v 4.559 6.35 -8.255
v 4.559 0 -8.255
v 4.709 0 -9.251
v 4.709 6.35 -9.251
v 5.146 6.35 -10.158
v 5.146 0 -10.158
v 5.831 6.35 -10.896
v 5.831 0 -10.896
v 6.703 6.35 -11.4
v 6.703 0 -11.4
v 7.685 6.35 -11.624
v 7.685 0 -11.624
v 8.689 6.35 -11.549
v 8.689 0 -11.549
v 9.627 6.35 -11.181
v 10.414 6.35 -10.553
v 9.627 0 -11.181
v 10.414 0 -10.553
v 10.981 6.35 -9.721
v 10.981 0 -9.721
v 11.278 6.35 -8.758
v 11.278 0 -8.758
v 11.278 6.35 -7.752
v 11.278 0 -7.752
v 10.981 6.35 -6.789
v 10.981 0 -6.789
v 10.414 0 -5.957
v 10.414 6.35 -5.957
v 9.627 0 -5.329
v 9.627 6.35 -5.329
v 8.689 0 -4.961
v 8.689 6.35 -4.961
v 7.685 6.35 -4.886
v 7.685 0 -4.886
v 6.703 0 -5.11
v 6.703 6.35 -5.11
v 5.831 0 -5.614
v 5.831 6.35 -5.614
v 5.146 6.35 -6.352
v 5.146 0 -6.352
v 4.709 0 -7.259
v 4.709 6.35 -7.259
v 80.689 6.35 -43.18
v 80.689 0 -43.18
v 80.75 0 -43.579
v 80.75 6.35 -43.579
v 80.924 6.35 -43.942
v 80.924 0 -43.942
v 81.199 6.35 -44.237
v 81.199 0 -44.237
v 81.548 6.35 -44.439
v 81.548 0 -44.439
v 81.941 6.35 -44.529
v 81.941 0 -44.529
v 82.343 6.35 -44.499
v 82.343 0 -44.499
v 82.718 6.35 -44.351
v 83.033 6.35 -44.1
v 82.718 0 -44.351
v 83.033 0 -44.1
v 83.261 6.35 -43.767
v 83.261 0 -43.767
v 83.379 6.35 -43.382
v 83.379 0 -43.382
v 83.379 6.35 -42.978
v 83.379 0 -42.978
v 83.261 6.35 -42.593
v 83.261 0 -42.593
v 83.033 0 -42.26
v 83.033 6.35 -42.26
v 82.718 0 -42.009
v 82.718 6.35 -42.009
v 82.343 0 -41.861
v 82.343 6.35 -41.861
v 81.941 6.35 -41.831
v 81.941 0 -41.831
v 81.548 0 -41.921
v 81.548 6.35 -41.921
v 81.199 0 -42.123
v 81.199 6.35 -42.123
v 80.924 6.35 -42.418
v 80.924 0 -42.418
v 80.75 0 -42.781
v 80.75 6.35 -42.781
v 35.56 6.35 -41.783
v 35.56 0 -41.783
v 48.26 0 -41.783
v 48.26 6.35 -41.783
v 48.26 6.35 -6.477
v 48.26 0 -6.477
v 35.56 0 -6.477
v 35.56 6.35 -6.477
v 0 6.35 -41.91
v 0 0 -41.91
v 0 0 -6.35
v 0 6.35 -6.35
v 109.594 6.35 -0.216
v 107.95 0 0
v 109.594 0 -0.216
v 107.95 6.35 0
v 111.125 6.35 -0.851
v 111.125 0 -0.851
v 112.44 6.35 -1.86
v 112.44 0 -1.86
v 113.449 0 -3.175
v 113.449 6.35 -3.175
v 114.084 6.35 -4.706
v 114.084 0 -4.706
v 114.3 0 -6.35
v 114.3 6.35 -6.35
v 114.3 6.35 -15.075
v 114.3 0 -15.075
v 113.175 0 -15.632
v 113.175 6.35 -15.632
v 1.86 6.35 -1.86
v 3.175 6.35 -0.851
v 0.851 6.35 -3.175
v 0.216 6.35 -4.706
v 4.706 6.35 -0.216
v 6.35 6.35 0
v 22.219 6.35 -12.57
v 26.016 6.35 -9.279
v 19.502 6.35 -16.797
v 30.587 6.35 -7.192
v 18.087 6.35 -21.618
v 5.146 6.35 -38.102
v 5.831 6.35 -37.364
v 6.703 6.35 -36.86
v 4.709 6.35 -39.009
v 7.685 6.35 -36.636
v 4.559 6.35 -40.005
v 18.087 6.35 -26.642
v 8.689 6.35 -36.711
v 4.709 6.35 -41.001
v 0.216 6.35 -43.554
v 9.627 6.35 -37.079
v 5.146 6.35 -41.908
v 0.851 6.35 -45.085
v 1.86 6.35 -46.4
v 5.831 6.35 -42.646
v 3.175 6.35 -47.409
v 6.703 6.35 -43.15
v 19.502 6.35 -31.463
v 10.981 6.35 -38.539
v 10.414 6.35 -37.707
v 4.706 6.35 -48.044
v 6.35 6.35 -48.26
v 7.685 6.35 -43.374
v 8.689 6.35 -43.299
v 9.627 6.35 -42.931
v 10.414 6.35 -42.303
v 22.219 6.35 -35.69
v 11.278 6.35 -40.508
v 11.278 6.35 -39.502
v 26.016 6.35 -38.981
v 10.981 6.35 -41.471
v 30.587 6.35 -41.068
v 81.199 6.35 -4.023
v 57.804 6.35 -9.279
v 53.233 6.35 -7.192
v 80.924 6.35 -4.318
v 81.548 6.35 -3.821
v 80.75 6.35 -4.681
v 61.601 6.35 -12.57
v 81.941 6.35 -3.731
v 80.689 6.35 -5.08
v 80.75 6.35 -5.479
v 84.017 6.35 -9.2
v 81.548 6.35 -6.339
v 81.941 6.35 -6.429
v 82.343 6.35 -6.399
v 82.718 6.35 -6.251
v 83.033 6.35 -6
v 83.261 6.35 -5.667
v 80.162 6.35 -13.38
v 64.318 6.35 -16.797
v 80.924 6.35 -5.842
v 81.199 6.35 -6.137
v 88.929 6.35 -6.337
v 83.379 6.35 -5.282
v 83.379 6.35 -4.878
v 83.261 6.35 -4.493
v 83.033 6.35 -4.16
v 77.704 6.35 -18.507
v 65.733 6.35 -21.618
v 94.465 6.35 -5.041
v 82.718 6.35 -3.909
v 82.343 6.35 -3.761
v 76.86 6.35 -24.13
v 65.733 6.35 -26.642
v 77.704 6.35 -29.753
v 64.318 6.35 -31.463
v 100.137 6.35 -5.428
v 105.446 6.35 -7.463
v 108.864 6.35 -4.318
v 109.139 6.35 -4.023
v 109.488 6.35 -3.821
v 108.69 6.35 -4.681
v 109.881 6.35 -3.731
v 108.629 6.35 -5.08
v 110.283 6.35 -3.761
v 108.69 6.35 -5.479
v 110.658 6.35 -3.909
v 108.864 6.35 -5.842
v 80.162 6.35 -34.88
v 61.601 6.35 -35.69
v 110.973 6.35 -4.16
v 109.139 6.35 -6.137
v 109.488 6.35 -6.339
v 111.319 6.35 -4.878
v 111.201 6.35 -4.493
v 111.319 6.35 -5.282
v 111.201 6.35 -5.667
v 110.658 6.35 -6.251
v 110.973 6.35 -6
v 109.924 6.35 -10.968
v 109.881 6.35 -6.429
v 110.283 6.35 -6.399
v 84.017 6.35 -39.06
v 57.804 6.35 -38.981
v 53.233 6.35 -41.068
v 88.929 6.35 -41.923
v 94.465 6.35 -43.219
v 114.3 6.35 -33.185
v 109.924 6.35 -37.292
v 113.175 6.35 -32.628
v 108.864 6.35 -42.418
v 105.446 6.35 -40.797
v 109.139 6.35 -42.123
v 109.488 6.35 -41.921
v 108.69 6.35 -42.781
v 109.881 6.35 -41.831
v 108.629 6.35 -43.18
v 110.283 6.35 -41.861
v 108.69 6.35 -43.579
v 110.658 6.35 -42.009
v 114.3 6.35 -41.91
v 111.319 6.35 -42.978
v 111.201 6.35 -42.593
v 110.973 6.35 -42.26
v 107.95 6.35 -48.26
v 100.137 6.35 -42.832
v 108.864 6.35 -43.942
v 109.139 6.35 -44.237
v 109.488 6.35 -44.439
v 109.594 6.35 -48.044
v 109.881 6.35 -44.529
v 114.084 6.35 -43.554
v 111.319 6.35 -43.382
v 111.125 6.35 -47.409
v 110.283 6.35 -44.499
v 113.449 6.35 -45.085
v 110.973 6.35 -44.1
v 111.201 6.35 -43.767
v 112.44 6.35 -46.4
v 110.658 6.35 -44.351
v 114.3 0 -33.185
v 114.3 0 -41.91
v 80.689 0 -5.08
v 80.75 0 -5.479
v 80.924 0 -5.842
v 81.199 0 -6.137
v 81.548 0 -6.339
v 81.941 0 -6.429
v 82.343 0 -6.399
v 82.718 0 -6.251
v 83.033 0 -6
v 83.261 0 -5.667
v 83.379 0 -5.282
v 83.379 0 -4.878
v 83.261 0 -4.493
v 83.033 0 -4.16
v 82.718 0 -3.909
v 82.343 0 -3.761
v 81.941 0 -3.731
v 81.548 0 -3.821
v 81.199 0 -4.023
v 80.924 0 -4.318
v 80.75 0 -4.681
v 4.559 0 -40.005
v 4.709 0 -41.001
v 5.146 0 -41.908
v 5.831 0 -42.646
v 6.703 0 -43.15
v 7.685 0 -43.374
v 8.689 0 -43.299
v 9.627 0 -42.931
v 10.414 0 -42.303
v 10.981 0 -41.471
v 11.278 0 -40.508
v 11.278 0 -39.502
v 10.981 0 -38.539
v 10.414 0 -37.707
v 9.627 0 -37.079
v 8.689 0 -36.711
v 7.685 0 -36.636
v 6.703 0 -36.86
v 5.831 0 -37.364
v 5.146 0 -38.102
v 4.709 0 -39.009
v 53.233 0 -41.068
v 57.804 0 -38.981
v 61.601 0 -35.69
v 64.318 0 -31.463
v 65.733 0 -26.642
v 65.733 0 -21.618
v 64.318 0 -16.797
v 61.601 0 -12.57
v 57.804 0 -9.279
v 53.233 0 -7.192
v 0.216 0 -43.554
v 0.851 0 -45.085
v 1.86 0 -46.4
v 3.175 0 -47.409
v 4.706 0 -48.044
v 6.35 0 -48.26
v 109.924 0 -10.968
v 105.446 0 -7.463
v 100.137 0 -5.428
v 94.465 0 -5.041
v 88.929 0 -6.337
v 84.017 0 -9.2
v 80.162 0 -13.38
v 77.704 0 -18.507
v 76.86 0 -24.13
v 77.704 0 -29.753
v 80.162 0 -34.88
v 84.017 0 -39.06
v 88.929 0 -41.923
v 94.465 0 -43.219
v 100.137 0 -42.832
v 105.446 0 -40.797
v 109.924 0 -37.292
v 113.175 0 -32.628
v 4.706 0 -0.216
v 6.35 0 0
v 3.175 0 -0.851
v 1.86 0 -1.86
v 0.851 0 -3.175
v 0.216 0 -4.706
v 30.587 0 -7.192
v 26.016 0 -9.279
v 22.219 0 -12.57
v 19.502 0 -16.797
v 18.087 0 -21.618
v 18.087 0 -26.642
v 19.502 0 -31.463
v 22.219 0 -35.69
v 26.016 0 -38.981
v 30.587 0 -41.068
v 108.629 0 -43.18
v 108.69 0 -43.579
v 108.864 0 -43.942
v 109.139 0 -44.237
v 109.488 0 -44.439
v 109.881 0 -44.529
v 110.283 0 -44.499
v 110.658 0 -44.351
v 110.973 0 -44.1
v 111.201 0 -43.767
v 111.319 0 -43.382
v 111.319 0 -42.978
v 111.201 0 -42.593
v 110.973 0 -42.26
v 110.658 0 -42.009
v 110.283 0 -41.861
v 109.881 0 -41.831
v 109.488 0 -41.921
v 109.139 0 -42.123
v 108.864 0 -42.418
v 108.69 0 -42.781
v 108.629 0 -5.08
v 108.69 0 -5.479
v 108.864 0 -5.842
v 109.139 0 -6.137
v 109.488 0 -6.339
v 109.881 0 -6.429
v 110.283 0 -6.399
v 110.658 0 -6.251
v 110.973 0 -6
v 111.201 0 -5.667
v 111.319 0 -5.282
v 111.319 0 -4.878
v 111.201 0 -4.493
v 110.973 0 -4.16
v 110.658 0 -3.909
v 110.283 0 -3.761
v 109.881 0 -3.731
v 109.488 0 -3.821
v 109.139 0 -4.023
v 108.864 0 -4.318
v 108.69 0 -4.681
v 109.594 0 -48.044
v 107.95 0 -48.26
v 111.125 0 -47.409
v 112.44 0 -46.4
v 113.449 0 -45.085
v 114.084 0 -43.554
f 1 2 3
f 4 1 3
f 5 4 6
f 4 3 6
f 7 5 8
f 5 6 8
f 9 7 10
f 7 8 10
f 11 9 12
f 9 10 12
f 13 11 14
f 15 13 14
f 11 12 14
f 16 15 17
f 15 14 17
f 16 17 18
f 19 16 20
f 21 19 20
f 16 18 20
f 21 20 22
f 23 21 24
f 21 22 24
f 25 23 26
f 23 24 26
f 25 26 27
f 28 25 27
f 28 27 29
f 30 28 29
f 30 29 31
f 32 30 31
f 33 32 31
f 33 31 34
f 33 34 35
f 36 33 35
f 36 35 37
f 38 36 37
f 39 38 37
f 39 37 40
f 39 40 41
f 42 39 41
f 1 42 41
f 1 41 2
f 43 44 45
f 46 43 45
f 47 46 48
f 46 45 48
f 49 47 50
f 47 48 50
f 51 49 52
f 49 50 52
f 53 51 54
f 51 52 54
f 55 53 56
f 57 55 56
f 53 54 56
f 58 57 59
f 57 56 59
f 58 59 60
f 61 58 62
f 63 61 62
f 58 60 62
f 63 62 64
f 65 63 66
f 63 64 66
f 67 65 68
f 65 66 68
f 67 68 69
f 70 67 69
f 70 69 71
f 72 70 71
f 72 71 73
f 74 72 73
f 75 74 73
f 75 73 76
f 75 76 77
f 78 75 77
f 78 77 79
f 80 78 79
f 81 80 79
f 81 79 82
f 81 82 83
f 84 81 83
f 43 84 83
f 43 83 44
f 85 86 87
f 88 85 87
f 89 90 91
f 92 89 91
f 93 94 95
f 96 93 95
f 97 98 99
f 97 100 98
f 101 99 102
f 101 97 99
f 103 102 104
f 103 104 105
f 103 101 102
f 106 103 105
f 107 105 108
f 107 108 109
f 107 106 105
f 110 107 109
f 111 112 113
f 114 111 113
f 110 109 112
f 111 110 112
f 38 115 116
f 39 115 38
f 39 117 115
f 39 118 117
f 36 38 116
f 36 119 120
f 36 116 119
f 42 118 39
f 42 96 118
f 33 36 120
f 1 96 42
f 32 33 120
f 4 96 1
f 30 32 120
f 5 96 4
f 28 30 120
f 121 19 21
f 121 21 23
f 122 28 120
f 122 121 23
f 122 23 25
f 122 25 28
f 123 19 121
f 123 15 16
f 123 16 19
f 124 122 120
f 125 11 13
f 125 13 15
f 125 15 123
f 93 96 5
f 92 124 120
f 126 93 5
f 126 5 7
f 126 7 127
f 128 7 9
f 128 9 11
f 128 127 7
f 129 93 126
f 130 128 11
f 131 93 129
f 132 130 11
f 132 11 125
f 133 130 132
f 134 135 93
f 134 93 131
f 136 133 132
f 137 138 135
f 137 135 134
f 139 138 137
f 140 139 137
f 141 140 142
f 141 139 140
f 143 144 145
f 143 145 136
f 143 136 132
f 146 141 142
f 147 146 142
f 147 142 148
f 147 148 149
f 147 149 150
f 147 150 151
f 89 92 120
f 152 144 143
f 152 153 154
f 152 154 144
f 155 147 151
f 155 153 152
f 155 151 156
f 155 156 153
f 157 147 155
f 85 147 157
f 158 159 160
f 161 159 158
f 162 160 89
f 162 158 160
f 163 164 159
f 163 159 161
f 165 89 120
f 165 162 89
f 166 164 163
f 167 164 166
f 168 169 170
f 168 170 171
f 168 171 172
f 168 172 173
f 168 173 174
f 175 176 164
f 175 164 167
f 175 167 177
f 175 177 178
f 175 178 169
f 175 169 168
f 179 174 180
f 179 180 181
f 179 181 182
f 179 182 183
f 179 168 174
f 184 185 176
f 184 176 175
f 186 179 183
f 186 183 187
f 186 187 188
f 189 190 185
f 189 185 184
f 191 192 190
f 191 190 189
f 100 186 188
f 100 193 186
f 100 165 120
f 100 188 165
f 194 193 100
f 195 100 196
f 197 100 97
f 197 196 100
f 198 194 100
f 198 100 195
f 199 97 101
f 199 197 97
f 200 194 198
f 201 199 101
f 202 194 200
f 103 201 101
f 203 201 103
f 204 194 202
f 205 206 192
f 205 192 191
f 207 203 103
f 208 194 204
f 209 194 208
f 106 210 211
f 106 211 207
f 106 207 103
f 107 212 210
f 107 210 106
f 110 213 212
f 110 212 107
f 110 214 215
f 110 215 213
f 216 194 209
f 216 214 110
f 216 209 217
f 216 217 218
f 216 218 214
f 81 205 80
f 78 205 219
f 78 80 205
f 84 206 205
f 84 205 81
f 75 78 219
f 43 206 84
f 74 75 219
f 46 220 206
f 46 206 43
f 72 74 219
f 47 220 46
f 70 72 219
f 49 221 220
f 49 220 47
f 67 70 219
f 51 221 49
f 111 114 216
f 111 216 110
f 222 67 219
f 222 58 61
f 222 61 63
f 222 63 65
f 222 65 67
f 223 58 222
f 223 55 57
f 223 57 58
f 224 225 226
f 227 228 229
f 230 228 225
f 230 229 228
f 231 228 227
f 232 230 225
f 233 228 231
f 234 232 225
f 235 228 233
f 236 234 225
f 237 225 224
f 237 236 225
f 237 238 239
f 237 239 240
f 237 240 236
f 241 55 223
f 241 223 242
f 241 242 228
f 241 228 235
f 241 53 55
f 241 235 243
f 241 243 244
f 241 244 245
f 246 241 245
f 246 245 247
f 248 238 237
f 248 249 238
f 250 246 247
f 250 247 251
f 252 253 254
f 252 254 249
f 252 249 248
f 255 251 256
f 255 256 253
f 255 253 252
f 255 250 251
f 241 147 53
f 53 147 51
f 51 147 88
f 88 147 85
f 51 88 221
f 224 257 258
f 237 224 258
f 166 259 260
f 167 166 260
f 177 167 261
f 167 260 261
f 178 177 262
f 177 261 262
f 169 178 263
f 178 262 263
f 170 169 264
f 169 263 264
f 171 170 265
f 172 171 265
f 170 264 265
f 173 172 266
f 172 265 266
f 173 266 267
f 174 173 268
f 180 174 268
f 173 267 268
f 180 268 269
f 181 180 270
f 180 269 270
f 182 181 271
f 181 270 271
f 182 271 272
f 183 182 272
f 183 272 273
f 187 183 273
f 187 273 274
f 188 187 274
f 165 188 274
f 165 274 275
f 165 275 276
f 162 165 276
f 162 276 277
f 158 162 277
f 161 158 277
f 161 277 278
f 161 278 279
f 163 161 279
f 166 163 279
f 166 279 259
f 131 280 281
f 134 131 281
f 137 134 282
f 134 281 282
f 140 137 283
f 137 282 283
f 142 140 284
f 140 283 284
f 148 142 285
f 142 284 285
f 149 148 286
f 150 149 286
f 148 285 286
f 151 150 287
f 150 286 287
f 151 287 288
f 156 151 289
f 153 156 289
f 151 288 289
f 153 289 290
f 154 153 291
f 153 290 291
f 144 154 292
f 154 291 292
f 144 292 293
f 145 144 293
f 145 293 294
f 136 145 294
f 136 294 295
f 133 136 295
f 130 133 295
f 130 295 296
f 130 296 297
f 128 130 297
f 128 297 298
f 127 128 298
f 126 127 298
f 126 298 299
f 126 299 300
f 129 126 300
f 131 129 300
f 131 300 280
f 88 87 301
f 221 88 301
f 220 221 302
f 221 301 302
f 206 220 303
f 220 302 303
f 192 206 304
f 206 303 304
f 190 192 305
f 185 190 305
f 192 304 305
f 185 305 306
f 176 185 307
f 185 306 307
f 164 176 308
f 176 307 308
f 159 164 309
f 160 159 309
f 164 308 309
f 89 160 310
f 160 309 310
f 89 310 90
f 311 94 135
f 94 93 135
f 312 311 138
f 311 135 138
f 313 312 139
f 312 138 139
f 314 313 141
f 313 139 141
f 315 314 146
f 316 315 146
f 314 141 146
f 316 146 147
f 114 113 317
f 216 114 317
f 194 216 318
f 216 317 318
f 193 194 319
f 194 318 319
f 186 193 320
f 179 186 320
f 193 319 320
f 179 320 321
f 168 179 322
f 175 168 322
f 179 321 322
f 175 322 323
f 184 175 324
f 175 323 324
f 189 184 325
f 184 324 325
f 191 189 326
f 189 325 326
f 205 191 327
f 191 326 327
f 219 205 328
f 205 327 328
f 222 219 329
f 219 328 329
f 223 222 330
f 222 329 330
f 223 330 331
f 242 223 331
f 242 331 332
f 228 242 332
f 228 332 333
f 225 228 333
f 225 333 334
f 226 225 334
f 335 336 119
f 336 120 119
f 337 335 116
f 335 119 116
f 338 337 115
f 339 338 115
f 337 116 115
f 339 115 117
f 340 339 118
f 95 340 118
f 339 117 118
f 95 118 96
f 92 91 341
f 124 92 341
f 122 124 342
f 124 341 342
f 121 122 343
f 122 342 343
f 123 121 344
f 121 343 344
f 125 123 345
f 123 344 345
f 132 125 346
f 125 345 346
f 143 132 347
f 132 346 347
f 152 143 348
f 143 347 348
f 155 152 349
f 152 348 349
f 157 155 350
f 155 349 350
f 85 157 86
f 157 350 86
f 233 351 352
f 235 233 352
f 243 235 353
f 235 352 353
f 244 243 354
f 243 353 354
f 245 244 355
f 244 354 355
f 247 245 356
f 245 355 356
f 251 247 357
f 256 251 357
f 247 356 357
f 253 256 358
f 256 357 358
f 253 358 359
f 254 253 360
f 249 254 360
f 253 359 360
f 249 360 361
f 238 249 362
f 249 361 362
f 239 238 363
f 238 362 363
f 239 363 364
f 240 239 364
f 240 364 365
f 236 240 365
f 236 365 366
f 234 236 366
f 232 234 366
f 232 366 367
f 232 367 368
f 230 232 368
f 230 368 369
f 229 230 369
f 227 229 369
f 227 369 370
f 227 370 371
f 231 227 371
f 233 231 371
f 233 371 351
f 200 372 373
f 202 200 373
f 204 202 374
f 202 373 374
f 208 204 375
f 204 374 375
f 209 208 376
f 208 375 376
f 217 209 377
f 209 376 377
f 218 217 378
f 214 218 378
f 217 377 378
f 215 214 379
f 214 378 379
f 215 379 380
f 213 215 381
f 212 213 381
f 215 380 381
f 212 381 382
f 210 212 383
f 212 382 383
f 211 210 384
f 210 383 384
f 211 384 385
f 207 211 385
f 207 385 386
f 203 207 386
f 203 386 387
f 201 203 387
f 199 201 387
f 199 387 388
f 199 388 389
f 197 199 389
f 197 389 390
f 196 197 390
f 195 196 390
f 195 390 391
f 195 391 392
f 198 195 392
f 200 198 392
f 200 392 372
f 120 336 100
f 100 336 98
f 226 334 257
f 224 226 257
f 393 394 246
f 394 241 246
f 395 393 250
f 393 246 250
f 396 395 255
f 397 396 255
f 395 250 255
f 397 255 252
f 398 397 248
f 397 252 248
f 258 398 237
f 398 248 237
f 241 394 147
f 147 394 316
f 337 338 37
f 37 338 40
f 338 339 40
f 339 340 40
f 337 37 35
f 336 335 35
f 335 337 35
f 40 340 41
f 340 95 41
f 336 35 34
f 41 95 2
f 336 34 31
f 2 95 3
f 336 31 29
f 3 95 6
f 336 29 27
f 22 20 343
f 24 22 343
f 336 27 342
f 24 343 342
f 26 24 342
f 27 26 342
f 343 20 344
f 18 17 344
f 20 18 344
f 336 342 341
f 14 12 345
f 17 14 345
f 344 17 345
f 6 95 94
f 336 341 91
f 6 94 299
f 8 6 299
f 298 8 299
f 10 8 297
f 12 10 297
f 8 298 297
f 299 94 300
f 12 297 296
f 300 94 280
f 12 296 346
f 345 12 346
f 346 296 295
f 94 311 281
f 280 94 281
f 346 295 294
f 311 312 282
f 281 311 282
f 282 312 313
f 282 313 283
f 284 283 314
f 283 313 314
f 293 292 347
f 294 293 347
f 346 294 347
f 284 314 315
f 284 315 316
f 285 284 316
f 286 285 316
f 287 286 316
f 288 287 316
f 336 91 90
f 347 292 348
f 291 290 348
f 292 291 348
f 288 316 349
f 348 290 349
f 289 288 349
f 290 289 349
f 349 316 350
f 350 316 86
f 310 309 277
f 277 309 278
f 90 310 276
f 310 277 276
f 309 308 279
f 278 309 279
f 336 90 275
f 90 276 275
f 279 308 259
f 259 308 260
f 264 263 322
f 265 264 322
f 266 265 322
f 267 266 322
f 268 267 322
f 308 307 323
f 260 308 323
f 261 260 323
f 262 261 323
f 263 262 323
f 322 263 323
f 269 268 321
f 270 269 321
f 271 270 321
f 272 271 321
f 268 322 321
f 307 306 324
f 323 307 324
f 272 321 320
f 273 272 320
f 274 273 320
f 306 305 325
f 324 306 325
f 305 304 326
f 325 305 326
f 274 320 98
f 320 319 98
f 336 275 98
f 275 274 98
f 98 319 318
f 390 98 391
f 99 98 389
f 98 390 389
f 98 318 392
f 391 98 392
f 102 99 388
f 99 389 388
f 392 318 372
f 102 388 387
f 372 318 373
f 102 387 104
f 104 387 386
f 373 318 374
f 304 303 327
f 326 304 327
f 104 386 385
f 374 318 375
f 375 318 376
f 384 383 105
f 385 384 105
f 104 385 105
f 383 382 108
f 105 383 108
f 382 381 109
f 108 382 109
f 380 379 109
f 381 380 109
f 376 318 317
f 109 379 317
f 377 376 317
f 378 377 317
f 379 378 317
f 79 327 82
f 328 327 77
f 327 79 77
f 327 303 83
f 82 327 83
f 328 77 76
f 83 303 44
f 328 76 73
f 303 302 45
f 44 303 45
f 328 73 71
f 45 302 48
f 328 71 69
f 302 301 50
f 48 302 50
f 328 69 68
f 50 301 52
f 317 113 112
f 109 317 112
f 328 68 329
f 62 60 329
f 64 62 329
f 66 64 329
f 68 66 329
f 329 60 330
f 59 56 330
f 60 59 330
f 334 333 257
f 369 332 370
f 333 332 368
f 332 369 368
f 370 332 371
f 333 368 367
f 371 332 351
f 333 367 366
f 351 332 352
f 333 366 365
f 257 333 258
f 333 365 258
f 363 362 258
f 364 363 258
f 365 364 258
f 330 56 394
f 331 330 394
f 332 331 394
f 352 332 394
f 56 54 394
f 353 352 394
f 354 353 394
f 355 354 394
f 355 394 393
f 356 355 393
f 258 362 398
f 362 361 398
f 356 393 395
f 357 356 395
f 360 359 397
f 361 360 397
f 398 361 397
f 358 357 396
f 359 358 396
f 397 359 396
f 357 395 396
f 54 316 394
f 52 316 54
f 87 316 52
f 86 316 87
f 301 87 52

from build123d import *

# Parameters (mm, degrees)
BOSS_EXTRUDE1_DEPTH       = 6.35
FILLET1_R                 = 6.35
F_1_4_CLEARANCE_HOLE1_D   = 6.7564
TAP_DRILL_FOR_6_32_TAP1_D = 2.7051


with BuildPart() as part:
    # Sketch1 → Boss-Extrude1 (new body)
    with BuildSketch(Plane(origin=(0, 0, 0), x_dir=(1, 0, 0), z_dir=(0, 1, 0))):
        with BuildLine():
            Line((0, 0), (114.3, 0))
            Line((114.3, 0), (114.3, 15.075180871))
            Line((114.3, 15.075180871), (113.175058985, 15.632165638))
            ThreePointArc((113.175058985, 15.632165638), (76.8604, 24.13), (113.175058985, 32.627834362))
            Line((113.175058985, 32.627834362), (114.3, 33.184819129))
            Line((114.3, 33.184819129), (114.3, 48.26))
            Line((114.3, 48.26), (0, 48.26))
            Line((0, 48.26), (0, 0))
        make_face()
        with BuildLine():
            Line((35.56, 41.783), (48.26, 41.783))
            ThreePointArc((48.26, 41.783), (65.913, 24.13), (48.26, 6.477))
            Line((48.26, 6.477), (35.56, 6.477))
            ThreePointArc((35.56, 6.477), (17.907, 24.13), (35.56, 41.783))
        make_face(mode=Mode.SUBTRACT)
    extrude(amount=BOSS_EXTRUDE1_DEPTH)

    # Fillet1
    fillet1_edges = [part.edges().sort_by_distance(p)[0] for p in [
        (0, 3.175, 0),
        (0, 3.175, -48.26),
        (114.3, 3.175, -48.26),
        (114.3, 3.175, 0),
    ]]
    fillet(fillet1_edges, radius=FILLET1_R)

    # 1/4 Clearance Hole1 (through all)
    with Locations(Plane(origin=(0, 6.35, 0), x_dir=(1, 0, 0), z_dir=(0, 1, 0))):
        with Locations((7.9375, 40.005), (7.9375, 8.255)):
            Hole(F_1_4_CLEARANCE_HOLE1_D / 2)

    # Tap Drill for #6-32 Tap1 (through all)
    with Locations(Plane(origin=(0, 6.35, 0), x_dir=(1, 0, 0), z_dir=(0, 1, 0))):
        with Locations((82.042, 43.18), (109.982, 43.18), (109.982, 5.08), (82.042, 5.08), (96.012, 24.13)):
            Hole(TAP_DRILL_FOR_6_32_TAP1_D / 2)


solid = part.part
